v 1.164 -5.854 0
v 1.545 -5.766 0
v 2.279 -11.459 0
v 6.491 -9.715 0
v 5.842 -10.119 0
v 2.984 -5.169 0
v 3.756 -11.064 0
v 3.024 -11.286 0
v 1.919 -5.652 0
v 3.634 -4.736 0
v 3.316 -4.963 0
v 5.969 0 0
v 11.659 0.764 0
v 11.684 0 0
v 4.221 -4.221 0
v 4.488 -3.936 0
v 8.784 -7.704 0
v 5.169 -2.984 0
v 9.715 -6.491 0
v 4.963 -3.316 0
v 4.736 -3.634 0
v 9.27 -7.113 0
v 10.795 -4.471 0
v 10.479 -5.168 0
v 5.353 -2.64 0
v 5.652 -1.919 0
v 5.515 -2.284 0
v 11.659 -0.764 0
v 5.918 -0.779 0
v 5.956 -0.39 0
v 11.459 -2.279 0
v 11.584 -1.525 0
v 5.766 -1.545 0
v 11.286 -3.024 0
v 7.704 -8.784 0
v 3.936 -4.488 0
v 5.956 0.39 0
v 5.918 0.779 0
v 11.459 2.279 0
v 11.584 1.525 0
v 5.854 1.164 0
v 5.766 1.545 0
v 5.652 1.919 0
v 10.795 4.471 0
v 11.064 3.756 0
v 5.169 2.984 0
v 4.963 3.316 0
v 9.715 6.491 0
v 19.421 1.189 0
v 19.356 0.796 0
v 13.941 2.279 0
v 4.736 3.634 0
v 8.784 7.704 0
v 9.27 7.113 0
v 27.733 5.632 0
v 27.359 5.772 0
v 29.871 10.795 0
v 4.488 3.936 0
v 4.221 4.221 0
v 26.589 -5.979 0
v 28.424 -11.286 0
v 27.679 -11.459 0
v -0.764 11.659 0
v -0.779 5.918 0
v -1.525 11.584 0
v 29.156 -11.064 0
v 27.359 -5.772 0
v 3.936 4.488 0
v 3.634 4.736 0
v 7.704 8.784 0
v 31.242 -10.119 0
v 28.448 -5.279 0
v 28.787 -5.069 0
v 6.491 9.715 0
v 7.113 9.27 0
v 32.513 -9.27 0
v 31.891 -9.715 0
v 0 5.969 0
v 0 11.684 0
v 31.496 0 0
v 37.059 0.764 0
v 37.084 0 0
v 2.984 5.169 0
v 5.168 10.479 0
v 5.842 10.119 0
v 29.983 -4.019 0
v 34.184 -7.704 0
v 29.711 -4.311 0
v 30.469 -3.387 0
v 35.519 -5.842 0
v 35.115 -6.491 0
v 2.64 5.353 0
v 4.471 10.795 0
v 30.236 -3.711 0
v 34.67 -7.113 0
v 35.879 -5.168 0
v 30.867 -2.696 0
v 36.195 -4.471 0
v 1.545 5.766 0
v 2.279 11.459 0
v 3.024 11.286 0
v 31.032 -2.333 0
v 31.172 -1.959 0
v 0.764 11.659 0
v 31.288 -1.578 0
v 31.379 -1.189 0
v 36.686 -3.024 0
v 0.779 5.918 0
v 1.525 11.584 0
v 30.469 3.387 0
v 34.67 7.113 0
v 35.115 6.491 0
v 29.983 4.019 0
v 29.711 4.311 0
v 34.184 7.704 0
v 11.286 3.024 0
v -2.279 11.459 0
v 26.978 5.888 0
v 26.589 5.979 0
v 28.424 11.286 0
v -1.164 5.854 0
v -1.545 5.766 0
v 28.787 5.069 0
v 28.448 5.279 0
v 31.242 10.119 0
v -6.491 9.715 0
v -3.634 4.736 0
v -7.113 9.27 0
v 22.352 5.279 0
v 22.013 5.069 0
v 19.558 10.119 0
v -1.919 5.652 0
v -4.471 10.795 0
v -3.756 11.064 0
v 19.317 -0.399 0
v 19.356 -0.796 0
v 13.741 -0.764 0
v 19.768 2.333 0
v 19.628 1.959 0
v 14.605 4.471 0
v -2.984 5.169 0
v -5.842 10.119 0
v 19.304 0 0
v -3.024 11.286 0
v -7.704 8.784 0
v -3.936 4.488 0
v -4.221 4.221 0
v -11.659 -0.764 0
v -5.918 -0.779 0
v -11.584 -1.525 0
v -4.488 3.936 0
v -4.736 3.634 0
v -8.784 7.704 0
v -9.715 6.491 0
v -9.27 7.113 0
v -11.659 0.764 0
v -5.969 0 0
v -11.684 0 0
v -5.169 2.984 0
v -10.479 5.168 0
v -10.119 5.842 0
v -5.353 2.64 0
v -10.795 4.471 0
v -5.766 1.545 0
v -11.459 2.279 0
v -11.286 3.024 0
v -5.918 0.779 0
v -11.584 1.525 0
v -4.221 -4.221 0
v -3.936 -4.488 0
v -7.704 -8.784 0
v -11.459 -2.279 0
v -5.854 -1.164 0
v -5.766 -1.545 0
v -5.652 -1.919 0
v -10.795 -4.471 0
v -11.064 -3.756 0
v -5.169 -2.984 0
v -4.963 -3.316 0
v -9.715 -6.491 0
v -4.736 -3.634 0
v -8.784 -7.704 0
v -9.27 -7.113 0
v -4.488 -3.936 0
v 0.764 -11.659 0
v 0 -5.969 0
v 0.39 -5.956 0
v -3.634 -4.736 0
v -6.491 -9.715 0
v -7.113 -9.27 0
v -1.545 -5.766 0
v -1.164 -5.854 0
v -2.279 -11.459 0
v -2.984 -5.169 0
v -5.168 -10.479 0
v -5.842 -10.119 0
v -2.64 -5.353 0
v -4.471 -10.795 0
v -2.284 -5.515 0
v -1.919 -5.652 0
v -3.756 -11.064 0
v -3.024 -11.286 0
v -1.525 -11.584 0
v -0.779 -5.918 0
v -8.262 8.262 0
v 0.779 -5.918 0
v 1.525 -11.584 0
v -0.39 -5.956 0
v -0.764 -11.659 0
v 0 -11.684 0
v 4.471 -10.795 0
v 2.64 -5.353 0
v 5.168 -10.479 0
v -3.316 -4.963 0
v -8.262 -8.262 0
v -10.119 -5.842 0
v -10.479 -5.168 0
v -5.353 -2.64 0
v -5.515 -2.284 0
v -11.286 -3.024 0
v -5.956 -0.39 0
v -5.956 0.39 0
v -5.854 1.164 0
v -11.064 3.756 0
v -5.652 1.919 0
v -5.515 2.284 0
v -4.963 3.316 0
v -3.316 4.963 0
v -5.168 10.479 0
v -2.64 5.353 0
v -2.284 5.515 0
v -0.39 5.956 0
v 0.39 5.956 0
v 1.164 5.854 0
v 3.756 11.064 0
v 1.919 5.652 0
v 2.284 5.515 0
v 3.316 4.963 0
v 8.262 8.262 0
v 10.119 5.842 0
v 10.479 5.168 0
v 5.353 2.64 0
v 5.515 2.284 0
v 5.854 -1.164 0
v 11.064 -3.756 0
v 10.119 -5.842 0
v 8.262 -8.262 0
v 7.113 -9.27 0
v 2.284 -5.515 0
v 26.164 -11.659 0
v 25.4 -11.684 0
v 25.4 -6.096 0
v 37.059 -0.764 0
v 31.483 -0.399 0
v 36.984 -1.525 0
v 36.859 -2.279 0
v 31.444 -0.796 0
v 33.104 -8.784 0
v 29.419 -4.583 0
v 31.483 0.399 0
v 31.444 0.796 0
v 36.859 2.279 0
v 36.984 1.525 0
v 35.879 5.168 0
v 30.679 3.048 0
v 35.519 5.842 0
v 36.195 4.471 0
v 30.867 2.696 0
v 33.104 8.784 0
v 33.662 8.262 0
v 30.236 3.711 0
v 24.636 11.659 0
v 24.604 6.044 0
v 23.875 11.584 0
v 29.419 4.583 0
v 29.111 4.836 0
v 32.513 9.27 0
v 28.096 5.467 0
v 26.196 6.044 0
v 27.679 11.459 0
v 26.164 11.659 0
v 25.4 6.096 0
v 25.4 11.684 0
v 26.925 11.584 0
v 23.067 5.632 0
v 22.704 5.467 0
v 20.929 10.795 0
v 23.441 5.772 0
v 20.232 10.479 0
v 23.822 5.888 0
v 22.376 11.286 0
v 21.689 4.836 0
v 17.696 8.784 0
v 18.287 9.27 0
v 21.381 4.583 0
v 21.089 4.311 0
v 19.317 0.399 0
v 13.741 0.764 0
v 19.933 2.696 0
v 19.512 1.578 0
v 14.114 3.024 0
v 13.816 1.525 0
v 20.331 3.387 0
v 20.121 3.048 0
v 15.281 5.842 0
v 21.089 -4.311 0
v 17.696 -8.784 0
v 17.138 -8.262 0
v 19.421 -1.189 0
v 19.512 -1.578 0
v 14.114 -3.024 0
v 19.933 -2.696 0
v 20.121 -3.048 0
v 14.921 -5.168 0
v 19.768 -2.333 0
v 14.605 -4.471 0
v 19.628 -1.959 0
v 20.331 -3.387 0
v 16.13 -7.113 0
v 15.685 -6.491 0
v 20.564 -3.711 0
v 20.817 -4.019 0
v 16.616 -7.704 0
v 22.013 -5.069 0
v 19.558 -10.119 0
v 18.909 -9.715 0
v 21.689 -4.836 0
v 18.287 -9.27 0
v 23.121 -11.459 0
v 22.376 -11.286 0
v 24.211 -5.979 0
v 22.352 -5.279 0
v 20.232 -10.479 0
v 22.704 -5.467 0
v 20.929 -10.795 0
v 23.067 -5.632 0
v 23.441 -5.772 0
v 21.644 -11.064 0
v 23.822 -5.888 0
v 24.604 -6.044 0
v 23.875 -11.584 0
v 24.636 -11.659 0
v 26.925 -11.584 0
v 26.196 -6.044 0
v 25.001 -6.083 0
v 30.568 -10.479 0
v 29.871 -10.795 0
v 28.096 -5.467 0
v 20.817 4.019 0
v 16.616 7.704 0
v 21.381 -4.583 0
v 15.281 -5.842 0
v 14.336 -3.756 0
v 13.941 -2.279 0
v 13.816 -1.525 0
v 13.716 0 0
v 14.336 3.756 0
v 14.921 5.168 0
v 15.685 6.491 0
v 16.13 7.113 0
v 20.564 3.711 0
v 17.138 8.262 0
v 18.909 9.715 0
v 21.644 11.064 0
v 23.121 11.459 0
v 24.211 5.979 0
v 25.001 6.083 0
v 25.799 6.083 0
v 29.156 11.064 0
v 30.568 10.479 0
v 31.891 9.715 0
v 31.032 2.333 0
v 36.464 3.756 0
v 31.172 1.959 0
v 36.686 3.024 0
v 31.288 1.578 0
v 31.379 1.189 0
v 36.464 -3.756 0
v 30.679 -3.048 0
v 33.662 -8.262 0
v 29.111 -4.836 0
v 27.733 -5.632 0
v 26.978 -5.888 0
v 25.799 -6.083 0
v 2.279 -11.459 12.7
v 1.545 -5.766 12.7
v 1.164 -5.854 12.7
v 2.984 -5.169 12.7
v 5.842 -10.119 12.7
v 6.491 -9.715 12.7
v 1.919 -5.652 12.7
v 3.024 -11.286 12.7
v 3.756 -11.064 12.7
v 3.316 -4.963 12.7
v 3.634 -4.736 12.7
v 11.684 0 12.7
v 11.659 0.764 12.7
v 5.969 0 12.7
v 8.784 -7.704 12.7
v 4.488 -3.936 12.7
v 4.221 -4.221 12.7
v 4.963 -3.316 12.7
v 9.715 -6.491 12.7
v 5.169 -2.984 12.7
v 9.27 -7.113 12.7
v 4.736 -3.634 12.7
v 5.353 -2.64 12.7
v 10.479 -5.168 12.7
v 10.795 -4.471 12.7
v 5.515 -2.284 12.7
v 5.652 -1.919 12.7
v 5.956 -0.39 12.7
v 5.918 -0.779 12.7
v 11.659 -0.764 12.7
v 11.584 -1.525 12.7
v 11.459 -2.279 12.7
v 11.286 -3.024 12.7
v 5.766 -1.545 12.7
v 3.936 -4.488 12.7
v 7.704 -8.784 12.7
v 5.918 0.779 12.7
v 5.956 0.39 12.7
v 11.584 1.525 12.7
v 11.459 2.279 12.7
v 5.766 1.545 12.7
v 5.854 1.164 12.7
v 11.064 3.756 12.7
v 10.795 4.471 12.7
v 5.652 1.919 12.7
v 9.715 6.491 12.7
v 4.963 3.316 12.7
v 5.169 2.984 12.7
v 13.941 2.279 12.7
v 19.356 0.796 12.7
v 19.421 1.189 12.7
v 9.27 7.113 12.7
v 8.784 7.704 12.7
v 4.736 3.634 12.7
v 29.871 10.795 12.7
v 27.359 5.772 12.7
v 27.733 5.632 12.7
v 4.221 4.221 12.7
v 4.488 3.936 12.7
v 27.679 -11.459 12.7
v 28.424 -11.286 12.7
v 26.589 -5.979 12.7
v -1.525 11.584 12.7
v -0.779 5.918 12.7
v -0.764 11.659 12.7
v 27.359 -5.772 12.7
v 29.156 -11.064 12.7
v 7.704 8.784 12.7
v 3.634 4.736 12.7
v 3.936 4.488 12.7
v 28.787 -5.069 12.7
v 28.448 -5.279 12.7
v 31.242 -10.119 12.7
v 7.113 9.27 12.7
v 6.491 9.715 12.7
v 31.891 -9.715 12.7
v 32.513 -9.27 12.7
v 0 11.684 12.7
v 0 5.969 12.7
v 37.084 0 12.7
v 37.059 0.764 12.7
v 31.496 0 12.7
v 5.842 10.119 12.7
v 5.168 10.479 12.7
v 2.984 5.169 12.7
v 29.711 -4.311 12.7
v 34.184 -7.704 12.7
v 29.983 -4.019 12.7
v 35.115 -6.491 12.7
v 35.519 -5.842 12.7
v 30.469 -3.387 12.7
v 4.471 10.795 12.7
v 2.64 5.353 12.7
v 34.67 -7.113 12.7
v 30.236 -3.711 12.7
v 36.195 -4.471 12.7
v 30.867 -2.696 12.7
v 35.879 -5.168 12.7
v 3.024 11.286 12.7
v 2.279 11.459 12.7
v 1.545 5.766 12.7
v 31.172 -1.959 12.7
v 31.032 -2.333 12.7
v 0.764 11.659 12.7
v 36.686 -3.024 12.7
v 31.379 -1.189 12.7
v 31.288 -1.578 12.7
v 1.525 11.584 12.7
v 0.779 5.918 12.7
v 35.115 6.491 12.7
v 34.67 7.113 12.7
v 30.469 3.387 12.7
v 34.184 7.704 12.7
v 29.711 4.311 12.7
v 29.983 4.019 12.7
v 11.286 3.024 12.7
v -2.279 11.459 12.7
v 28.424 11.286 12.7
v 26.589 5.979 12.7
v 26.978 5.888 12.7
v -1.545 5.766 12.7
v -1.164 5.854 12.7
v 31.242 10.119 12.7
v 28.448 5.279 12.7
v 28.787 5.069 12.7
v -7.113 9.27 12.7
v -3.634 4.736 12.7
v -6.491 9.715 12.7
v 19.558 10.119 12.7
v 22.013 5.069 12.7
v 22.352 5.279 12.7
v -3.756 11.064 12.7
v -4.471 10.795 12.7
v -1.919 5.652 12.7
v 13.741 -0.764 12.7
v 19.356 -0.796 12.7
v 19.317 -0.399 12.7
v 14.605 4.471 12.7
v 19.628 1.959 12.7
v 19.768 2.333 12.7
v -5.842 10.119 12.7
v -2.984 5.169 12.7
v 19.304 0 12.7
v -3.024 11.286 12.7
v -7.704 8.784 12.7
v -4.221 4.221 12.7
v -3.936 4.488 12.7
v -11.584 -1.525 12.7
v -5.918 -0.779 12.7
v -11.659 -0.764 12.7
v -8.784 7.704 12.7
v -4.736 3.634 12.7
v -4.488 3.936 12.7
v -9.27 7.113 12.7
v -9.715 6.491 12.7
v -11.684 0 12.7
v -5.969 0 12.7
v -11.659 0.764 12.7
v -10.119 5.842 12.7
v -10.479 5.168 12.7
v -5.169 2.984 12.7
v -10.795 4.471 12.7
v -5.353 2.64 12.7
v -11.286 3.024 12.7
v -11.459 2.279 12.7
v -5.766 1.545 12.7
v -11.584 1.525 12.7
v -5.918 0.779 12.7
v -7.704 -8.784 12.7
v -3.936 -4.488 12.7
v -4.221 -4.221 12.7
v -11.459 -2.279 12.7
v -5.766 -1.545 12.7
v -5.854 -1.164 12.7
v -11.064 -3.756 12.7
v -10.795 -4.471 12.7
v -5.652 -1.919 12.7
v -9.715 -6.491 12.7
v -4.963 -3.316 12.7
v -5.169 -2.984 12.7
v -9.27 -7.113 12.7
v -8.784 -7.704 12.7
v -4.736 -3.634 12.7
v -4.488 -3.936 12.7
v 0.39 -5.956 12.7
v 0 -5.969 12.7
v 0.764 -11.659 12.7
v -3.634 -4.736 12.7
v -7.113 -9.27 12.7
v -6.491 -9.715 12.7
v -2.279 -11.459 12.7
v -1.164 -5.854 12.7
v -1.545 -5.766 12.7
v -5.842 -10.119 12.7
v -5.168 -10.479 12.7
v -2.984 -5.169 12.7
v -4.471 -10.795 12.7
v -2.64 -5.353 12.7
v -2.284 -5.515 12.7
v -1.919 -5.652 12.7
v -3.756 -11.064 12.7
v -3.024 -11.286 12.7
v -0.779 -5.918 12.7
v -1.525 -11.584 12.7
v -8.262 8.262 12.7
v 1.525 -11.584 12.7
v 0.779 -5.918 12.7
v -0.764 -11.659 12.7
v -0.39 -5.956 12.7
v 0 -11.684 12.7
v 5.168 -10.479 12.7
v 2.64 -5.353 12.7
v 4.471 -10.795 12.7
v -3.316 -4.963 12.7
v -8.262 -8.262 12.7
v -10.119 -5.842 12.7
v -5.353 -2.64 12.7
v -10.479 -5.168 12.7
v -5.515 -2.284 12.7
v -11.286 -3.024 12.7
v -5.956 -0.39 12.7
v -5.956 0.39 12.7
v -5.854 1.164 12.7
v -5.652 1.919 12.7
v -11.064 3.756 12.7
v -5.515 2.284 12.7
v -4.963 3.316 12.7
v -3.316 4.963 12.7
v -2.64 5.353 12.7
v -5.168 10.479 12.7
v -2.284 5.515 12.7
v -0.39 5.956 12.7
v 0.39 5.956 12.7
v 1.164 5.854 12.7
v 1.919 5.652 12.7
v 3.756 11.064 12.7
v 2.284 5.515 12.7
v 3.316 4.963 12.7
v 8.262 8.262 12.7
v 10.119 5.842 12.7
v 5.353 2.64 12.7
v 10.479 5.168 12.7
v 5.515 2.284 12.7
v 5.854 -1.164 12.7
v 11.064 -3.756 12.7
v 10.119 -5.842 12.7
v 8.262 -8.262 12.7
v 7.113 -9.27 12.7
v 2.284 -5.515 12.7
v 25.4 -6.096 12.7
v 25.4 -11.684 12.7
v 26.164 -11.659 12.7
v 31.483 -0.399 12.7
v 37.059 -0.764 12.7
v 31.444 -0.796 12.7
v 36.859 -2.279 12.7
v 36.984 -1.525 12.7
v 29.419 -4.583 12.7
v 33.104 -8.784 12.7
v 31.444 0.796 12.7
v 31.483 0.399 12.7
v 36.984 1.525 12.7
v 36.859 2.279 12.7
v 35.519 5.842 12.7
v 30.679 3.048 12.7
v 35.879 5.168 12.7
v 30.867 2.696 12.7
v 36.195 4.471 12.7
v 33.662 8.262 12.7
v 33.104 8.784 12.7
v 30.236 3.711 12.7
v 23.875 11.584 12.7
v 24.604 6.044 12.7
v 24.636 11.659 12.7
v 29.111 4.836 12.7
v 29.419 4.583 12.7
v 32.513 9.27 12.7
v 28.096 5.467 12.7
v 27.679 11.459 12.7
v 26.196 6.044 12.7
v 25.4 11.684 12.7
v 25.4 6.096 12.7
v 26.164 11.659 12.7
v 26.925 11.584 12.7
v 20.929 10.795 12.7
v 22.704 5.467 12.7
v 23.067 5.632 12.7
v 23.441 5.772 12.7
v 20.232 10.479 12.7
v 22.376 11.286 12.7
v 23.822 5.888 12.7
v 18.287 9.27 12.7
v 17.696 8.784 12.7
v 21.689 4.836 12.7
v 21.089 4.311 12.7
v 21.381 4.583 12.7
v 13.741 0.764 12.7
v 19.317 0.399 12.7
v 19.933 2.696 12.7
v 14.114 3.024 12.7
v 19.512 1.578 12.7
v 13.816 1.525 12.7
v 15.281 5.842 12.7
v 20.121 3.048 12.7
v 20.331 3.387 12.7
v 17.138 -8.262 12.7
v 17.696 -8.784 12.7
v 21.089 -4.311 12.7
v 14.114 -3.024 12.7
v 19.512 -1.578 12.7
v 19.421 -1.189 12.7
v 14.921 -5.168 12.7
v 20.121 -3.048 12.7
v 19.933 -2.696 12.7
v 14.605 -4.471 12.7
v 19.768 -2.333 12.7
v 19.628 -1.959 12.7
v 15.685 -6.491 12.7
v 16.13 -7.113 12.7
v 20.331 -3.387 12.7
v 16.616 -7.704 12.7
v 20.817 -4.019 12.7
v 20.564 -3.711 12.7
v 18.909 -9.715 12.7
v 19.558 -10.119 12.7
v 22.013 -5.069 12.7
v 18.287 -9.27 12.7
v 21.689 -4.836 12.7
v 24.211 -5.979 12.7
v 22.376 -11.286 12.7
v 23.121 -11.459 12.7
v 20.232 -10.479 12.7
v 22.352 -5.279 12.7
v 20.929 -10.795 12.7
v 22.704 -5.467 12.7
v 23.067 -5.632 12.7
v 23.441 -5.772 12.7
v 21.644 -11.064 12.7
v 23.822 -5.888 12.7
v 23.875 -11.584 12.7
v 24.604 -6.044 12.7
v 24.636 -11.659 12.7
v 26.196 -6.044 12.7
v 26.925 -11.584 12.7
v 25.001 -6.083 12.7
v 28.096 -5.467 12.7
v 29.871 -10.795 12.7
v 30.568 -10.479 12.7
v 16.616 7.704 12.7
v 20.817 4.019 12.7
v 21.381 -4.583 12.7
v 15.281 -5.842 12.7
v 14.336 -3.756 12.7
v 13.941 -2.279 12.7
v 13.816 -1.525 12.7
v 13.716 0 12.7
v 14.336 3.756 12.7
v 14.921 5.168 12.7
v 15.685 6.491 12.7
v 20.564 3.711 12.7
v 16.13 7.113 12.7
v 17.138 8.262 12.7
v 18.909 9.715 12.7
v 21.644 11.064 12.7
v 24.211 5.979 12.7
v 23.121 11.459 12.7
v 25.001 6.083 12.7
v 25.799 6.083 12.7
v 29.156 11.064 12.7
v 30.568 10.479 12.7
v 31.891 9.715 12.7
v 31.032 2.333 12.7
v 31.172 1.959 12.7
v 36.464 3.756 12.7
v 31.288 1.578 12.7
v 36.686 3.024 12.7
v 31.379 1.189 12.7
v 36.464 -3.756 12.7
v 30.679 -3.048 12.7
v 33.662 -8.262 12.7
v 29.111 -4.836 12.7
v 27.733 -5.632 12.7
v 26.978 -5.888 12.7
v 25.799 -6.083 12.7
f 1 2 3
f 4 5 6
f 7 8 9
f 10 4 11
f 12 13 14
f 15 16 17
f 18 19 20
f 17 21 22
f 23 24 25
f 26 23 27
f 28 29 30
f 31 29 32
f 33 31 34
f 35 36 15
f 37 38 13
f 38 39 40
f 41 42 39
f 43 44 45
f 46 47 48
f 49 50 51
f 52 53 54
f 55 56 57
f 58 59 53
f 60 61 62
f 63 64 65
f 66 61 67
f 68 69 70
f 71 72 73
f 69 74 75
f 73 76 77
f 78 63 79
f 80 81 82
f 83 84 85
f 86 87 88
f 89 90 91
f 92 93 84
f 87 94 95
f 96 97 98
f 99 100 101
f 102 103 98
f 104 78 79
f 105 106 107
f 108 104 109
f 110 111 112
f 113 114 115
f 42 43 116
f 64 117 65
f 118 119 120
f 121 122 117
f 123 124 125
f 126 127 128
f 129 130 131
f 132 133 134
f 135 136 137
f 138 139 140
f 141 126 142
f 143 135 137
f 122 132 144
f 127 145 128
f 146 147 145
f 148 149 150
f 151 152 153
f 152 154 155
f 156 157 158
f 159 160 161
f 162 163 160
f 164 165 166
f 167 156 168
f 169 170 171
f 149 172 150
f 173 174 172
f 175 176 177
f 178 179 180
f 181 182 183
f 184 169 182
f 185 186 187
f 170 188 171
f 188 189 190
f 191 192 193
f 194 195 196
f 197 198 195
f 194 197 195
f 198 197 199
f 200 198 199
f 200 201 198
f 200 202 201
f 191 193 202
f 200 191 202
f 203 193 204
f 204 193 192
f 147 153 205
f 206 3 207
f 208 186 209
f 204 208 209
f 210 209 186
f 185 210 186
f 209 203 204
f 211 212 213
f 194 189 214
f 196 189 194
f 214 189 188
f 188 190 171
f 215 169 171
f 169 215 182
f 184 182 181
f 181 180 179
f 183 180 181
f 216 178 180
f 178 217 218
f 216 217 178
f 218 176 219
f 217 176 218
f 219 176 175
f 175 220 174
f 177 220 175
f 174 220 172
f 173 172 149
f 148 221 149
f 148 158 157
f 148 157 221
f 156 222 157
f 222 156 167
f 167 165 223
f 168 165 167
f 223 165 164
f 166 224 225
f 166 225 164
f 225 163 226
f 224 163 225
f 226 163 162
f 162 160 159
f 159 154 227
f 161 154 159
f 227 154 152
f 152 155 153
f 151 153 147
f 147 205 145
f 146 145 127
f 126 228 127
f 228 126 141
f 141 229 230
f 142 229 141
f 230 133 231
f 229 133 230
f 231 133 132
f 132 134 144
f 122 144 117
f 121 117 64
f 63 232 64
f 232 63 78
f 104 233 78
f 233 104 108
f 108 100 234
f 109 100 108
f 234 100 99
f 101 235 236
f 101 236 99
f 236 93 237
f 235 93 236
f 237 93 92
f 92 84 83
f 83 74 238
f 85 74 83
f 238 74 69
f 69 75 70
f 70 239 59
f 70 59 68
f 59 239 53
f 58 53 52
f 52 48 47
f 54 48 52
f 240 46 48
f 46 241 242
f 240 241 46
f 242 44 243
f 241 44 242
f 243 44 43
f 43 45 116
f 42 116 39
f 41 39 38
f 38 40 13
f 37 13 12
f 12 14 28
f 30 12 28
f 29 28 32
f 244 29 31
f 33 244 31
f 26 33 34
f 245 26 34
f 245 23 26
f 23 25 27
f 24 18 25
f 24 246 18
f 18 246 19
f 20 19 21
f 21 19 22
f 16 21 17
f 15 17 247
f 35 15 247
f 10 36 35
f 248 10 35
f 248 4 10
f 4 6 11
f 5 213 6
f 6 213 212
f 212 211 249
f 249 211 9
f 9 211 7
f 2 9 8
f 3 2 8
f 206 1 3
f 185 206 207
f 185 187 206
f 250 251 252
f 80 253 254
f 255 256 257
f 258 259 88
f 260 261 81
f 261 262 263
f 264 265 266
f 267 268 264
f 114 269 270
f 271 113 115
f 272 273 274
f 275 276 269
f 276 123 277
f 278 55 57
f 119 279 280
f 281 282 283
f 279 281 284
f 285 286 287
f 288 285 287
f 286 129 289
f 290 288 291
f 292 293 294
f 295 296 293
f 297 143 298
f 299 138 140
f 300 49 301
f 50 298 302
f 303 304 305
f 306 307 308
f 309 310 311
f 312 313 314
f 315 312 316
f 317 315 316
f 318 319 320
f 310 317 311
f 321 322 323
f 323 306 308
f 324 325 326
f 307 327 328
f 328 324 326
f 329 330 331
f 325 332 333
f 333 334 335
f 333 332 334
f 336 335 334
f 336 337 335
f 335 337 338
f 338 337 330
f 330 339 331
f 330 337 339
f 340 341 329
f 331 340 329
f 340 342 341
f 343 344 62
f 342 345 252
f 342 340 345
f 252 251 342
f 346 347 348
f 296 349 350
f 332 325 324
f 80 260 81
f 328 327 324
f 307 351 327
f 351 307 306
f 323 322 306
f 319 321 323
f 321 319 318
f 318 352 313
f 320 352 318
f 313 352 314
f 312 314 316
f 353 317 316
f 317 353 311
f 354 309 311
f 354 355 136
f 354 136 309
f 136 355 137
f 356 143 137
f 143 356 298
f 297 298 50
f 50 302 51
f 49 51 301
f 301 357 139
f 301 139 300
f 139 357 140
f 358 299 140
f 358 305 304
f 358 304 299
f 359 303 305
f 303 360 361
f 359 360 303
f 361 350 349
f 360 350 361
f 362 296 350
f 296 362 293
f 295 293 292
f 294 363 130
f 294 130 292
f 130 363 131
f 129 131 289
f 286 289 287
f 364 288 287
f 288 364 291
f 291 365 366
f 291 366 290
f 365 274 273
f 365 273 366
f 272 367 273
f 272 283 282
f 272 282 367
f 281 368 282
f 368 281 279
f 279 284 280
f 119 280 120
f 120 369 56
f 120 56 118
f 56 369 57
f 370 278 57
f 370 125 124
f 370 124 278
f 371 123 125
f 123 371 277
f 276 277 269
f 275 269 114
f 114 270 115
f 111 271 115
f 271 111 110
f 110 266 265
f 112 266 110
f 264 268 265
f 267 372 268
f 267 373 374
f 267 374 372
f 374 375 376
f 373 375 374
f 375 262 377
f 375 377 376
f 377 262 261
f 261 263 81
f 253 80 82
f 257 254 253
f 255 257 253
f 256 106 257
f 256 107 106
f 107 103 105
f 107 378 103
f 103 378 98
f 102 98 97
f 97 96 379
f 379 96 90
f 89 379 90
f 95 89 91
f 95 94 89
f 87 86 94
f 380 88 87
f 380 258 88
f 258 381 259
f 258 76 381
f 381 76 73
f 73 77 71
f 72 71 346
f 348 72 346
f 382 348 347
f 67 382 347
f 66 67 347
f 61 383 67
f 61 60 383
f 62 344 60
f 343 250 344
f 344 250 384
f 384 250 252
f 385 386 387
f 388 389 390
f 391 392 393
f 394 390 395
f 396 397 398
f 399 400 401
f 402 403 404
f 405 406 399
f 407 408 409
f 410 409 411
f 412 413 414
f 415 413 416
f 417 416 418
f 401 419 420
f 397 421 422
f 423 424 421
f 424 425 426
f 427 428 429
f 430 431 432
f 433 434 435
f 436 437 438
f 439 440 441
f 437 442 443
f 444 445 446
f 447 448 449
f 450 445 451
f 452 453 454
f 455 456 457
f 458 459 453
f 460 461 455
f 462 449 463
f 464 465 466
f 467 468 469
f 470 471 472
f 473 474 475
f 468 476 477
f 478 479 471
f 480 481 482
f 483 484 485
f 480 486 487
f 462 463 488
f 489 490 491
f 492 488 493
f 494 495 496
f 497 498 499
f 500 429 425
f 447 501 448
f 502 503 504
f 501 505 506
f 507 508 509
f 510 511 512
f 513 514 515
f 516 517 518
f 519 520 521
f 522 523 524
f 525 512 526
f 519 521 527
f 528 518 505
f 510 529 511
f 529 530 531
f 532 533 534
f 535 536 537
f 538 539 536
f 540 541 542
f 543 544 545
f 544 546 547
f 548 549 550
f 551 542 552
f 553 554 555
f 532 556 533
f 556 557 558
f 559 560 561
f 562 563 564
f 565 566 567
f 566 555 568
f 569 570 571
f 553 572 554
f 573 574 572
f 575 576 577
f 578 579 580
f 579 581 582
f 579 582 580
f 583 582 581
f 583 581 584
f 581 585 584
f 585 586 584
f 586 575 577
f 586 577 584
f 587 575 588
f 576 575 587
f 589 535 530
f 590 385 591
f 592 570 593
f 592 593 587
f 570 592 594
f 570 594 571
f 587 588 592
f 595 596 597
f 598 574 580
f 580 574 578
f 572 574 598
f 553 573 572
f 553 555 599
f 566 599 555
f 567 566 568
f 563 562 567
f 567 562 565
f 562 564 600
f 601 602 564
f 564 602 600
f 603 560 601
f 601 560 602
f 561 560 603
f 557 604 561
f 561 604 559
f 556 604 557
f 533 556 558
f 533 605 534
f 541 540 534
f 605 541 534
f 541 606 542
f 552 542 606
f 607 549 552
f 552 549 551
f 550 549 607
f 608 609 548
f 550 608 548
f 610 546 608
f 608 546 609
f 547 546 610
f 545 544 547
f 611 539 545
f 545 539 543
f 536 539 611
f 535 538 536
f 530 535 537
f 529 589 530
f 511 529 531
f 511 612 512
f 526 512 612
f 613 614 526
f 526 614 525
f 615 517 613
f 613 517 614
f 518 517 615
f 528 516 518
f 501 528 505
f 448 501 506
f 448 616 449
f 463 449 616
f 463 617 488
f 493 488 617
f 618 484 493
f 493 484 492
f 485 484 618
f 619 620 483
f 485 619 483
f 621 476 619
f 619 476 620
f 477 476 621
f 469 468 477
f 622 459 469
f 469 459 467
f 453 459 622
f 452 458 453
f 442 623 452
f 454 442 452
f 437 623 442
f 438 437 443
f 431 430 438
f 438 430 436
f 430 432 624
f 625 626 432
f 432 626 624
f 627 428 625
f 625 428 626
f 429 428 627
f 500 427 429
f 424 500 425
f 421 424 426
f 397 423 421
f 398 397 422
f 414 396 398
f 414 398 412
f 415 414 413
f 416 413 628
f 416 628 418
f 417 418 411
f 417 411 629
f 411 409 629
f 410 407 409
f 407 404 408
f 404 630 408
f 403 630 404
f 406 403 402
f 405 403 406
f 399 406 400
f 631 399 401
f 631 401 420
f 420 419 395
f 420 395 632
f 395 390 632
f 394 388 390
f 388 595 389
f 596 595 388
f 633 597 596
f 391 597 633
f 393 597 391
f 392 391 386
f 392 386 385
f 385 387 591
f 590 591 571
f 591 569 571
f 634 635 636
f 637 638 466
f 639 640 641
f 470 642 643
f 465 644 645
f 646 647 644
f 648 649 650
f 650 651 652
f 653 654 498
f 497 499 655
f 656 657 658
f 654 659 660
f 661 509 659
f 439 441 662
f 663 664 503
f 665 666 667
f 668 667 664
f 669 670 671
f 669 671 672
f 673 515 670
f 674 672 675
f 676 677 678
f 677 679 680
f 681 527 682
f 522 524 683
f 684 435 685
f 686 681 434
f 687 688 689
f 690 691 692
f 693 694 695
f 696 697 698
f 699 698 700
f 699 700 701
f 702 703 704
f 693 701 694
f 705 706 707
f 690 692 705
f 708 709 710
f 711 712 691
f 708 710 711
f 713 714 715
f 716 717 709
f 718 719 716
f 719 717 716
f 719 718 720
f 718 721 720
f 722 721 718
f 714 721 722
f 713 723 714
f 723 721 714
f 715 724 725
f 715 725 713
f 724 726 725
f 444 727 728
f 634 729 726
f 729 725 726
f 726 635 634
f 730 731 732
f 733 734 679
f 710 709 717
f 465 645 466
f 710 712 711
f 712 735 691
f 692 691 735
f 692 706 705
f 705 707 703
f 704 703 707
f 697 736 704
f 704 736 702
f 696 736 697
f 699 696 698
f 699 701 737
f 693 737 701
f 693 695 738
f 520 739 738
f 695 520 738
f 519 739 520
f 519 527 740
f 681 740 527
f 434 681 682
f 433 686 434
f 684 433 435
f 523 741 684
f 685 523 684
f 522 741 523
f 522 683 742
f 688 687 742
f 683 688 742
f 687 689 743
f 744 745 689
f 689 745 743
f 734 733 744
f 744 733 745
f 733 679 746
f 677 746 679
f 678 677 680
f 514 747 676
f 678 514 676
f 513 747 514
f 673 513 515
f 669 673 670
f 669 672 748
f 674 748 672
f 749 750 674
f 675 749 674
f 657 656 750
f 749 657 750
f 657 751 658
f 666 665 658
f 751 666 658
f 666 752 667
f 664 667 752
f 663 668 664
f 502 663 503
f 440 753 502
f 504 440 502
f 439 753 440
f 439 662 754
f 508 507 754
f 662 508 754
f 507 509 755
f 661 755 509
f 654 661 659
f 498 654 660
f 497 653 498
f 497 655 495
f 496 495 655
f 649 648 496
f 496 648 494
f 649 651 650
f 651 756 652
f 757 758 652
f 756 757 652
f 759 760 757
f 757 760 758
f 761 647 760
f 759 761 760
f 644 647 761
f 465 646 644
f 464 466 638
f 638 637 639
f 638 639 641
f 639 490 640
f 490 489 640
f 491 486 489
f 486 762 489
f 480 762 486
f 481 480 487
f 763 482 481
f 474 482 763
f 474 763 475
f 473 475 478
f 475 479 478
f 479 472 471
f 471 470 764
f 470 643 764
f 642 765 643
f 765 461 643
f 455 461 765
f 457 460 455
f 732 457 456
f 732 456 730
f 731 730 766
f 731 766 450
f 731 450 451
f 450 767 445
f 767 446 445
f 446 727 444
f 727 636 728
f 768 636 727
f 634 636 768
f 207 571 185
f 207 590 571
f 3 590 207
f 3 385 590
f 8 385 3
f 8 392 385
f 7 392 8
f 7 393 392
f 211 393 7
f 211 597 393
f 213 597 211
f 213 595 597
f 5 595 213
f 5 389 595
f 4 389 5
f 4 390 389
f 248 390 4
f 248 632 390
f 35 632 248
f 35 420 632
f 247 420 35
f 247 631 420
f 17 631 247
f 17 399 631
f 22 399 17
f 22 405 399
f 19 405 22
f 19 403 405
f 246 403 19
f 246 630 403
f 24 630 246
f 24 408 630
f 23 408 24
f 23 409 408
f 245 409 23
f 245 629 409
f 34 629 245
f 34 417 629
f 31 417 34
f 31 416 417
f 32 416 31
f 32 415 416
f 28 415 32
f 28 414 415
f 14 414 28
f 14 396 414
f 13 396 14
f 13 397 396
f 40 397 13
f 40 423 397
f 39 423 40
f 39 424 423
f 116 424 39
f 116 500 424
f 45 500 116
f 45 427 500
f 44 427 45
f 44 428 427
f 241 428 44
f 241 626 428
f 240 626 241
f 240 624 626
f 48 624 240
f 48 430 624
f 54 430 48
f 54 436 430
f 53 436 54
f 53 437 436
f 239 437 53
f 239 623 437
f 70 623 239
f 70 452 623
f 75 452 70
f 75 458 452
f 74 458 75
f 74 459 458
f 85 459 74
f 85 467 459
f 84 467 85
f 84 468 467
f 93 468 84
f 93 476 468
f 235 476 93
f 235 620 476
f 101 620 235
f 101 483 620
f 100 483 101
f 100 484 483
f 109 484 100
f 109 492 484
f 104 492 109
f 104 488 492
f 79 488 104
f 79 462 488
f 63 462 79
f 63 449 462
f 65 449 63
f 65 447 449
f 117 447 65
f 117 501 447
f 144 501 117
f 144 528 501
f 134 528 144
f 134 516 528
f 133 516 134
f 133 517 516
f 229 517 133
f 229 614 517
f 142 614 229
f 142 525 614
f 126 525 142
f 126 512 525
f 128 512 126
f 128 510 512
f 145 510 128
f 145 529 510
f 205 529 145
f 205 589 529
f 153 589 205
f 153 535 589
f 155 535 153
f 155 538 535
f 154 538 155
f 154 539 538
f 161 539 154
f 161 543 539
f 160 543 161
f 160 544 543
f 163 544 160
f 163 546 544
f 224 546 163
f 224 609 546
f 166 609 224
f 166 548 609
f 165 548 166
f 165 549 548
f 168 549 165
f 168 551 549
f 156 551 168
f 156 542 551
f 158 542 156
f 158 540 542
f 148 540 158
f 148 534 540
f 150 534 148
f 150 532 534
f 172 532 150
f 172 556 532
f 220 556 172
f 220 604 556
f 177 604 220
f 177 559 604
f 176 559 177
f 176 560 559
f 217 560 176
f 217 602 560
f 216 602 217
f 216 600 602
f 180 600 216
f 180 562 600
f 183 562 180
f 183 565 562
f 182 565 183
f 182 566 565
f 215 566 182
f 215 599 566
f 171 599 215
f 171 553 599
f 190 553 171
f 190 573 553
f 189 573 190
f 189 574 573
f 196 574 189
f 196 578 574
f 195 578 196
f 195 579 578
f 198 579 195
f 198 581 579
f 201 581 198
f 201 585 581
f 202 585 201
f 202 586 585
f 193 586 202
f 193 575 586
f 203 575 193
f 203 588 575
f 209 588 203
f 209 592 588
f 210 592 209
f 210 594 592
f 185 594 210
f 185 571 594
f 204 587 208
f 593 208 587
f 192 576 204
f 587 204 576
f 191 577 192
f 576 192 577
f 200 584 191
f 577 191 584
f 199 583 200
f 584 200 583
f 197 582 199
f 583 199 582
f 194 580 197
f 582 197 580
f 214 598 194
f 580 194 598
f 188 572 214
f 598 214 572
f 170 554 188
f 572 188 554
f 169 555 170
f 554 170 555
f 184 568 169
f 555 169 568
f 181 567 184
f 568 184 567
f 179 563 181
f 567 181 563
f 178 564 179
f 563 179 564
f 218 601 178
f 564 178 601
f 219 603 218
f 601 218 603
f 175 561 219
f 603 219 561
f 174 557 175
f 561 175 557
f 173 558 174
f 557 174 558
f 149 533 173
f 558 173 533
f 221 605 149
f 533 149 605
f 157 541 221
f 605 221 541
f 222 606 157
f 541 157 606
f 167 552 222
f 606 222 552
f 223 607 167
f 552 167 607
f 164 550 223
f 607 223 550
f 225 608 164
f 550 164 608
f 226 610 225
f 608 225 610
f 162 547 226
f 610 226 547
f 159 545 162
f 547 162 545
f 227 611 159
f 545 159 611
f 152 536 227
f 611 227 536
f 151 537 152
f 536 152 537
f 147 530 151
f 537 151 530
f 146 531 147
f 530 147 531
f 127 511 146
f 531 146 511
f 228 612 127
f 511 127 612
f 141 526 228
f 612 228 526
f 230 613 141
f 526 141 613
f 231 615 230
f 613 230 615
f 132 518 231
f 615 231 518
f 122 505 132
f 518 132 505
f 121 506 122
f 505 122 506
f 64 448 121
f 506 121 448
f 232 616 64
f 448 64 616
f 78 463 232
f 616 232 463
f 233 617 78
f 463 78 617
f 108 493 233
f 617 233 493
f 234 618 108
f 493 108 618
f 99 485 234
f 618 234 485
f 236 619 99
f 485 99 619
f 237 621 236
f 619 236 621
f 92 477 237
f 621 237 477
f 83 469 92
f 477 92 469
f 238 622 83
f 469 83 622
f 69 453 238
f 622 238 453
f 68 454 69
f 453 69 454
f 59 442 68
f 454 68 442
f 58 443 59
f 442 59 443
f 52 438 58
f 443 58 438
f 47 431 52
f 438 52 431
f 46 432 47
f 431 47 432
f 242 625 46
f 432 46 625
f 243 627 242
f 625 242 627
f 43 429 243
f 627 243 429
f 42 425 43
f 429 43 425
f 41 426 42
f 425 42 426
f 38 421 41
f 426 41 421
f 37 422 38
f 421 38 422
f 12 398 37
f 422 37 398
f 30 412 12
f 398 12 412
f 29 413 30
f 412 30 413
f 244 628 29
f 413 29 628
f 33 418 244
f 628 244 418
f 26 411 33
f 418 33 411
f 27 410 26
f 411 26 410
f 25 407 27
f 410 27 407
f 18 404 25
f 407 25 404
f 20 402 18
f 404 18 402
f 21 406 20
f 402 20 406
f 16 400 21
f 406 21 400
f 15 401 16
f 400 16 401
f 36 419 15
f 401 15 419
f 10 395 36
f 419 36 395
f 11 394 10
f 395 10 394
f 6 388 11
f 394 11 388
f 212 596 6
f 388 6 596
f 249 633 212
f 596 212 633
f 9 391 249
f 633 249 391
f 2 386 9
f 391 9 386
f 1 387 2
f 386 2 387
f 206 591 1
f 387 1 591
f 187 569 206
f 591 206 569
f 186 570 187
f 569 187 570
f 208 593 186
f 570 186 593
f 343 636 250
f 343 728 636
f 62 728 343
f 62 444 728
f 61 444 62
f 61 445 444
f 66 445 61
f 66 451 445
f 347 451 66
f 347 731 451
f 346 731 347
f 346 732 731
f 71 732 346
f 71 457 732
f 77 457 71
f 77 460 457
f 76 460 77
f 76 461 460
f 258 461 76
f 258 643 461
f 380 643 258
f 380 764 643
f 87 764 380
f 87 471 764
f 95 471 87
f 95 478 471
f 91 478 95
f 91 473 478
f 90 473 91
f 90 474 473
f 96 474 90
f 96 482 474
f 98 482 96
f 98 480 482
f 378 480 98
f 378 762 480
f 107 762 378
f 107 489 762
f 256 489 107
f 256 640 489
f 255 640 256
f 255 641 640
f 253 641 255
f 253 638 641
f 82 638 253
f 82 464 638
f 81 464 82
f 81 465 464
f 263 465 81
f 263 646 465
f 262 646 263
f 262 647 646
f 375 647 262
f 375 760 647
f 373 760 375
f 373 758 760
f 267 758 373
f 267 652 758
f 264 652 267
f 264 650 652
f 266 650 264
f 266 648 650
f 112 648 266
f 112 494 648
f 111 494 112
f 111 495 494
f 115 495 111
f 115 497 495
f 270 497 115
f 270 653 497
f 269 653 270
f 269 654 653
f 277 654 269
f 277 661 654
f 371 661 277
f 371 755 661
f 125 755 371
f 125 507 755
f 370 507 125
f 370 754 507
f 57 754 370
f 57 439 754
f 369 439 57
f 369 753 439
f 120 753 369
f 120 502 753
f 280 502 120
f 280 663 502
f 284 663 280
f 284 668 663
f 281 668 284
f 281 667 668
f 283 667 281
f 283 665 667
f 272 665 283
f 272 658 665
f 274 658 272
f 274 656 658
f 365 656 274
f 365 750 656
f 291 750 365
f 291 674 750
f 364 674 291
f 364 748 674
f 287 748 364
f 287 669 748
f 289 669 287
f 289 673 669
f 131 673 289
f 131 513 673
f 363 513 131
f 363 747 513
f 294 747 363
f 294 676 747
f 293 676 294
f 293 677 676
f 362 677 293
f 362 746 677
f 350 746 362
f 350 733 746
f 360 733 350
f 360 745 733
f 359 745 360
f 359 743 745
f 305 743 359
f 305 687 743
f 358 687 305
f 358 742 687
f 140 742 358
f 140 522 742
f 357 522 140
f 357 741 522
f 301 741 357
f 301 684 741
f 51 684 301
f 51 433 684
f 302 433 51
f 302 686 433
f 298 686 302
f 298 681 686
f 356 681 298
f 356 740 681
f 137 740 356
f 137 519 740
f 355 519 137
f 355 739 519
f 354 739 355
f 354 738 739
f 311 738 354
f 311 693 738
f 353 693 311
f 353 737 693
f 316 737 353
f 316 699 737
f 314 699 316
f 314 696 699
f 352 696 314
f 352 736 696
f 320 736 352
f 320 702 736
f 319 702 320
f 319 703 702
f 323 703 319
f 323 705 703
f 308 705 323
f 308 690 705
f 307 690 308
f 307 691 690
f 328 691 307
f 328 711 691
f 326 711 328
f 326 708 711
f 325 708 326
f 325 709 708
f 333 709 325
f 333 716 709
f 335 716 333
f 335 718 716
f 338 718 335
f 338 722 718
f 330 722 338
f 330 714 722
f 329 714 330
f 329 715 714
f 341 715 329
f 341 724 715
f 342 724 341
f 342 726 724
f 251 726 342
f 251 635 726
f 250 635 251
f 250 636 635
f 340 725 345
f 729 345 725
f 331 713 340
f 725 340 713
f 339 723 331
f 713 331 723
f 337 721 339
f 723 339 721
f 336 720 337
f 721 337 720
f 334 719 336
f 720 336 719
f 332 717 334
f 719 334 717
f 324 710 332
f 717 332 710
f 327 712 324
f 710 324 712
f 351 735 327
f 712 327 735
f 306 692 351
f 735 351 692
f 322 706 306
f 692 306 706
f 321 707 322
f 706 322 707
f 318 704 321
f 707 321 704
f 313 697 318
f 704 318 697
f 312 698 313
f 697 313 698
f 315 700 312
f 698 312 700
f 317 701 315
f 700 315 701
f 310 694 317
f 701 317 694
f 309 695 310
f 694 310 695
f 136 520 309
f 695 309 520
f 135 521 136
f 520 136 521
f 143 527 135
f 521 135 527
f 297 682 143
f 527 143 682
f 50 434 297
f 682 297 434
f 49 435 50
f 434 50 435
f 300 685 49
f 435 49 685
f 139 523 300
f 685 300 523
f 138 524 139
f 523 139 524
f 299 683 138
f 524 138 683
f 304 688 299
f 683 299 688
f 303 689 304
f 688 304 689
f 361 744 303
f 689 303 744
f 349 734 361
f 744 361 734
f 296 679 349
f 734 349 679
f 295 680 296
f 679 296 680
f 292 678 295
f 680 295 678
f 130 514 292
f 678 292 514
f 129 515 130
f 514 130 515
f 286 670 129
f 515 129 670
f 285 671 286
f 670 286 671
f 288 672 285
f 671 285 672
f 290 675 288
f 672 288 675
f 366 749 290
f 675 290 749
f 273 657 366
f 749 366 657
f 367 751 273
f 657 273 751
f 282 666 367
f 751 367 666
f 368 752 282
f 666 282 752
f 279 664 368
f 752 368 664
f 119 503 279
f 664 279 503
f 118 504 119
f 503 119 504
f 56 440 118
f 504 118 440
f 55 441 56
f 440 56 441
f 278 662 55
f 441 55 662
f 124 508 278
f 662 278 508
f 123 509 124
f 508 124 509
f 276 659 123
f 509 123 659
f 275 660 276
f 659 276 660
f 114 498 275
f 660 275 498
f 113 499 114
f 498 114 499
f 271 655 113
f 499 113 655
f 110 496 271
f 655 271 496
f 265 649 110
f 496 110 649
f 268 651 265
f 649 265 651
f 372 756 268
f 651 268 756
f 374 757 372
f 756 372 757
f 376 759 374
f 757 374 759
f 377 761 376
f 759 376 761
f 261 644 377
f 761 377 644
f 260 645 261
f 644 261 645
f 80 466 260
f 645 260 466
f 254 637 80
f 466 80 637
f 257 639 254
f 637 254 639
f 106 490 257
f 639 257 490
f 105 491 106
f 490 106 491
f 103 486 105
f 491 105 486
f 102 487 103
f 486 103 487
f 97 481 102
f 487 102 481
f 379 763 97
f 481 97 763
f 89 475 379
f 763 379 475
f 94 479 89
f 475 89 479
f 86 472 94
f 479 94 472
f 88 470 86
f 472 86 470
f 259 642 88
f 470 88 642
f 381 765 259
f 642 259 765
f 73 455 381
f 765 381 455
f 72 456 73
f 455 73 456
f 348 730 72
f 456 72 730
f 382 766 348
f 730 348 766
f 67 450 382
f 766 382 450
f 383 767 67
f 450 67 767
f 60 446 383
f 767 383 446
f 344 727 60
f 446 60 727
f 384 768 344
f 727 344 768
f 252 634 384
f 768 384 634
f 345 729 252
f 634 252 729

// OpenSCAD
// file: defs.scad
RealityScale = [1.27, 1.27, 1.27];
ViewScale = [0.0254, 0.0254, 0.0254];
JointVertSpace=20;
LayerUnit=300;
SpacedLayer=LayerUnit+JointVertSpace;
JointR = 400;
ShaftR = 200;
ShaftHole=220;
ShaftTight=230; // wood PLA
//ShaftTight=205; plastic PLA
HexTight=210;
MagicMult = 50;
StrutWidth = 400;
rrectR = 100;
ShaftSleeve = 200;

// Spine Horizontal
MagicA = MagicMult * 38;
// Spine Verticial
MagicL = MagicMult * 7.8;

// Leg Triangle
MagicG = MagicMult * 36.7; // a
MagicH = MagicMult * 65.7; // c
MagicI = MagicMult * 49;   // b

// Driver Triangle
MagicB = MagicMult * 41.5;
MagicD = MagicMult * 40.1;
MagicE = MagicMult * 55.8;

// Front Strut
MagicC = MagicMult * 39.3;
FsLen = MagicC;

// Back Strut
MagicF = MagicMult * 39.4;
BsLen = MagicF;

// Lower Driver Strut
MagicK = MagicMult * 61.9;

// Upper Driver Strut
MagicJ = MagicMult * 50;

// Cam radius
MagicM = MagicMult * 15;

spineLength = sqrt(pow(MagicA, 2) + pow(MagicL,2));
// main file
include <defs.scad>

scale(ViewScale)
{
    linear_extrude(500) {
    difference() {
    circle(ShaftTight*2, $fn=96);
    circle(ShaftTight+5, $fn=96); }

    translate([1000, 0, 0])
    difference() {
    circle(ShaftTight*2, $fn=96);
    circle(ShaftTight+10, $fn=96); }
    }
}
